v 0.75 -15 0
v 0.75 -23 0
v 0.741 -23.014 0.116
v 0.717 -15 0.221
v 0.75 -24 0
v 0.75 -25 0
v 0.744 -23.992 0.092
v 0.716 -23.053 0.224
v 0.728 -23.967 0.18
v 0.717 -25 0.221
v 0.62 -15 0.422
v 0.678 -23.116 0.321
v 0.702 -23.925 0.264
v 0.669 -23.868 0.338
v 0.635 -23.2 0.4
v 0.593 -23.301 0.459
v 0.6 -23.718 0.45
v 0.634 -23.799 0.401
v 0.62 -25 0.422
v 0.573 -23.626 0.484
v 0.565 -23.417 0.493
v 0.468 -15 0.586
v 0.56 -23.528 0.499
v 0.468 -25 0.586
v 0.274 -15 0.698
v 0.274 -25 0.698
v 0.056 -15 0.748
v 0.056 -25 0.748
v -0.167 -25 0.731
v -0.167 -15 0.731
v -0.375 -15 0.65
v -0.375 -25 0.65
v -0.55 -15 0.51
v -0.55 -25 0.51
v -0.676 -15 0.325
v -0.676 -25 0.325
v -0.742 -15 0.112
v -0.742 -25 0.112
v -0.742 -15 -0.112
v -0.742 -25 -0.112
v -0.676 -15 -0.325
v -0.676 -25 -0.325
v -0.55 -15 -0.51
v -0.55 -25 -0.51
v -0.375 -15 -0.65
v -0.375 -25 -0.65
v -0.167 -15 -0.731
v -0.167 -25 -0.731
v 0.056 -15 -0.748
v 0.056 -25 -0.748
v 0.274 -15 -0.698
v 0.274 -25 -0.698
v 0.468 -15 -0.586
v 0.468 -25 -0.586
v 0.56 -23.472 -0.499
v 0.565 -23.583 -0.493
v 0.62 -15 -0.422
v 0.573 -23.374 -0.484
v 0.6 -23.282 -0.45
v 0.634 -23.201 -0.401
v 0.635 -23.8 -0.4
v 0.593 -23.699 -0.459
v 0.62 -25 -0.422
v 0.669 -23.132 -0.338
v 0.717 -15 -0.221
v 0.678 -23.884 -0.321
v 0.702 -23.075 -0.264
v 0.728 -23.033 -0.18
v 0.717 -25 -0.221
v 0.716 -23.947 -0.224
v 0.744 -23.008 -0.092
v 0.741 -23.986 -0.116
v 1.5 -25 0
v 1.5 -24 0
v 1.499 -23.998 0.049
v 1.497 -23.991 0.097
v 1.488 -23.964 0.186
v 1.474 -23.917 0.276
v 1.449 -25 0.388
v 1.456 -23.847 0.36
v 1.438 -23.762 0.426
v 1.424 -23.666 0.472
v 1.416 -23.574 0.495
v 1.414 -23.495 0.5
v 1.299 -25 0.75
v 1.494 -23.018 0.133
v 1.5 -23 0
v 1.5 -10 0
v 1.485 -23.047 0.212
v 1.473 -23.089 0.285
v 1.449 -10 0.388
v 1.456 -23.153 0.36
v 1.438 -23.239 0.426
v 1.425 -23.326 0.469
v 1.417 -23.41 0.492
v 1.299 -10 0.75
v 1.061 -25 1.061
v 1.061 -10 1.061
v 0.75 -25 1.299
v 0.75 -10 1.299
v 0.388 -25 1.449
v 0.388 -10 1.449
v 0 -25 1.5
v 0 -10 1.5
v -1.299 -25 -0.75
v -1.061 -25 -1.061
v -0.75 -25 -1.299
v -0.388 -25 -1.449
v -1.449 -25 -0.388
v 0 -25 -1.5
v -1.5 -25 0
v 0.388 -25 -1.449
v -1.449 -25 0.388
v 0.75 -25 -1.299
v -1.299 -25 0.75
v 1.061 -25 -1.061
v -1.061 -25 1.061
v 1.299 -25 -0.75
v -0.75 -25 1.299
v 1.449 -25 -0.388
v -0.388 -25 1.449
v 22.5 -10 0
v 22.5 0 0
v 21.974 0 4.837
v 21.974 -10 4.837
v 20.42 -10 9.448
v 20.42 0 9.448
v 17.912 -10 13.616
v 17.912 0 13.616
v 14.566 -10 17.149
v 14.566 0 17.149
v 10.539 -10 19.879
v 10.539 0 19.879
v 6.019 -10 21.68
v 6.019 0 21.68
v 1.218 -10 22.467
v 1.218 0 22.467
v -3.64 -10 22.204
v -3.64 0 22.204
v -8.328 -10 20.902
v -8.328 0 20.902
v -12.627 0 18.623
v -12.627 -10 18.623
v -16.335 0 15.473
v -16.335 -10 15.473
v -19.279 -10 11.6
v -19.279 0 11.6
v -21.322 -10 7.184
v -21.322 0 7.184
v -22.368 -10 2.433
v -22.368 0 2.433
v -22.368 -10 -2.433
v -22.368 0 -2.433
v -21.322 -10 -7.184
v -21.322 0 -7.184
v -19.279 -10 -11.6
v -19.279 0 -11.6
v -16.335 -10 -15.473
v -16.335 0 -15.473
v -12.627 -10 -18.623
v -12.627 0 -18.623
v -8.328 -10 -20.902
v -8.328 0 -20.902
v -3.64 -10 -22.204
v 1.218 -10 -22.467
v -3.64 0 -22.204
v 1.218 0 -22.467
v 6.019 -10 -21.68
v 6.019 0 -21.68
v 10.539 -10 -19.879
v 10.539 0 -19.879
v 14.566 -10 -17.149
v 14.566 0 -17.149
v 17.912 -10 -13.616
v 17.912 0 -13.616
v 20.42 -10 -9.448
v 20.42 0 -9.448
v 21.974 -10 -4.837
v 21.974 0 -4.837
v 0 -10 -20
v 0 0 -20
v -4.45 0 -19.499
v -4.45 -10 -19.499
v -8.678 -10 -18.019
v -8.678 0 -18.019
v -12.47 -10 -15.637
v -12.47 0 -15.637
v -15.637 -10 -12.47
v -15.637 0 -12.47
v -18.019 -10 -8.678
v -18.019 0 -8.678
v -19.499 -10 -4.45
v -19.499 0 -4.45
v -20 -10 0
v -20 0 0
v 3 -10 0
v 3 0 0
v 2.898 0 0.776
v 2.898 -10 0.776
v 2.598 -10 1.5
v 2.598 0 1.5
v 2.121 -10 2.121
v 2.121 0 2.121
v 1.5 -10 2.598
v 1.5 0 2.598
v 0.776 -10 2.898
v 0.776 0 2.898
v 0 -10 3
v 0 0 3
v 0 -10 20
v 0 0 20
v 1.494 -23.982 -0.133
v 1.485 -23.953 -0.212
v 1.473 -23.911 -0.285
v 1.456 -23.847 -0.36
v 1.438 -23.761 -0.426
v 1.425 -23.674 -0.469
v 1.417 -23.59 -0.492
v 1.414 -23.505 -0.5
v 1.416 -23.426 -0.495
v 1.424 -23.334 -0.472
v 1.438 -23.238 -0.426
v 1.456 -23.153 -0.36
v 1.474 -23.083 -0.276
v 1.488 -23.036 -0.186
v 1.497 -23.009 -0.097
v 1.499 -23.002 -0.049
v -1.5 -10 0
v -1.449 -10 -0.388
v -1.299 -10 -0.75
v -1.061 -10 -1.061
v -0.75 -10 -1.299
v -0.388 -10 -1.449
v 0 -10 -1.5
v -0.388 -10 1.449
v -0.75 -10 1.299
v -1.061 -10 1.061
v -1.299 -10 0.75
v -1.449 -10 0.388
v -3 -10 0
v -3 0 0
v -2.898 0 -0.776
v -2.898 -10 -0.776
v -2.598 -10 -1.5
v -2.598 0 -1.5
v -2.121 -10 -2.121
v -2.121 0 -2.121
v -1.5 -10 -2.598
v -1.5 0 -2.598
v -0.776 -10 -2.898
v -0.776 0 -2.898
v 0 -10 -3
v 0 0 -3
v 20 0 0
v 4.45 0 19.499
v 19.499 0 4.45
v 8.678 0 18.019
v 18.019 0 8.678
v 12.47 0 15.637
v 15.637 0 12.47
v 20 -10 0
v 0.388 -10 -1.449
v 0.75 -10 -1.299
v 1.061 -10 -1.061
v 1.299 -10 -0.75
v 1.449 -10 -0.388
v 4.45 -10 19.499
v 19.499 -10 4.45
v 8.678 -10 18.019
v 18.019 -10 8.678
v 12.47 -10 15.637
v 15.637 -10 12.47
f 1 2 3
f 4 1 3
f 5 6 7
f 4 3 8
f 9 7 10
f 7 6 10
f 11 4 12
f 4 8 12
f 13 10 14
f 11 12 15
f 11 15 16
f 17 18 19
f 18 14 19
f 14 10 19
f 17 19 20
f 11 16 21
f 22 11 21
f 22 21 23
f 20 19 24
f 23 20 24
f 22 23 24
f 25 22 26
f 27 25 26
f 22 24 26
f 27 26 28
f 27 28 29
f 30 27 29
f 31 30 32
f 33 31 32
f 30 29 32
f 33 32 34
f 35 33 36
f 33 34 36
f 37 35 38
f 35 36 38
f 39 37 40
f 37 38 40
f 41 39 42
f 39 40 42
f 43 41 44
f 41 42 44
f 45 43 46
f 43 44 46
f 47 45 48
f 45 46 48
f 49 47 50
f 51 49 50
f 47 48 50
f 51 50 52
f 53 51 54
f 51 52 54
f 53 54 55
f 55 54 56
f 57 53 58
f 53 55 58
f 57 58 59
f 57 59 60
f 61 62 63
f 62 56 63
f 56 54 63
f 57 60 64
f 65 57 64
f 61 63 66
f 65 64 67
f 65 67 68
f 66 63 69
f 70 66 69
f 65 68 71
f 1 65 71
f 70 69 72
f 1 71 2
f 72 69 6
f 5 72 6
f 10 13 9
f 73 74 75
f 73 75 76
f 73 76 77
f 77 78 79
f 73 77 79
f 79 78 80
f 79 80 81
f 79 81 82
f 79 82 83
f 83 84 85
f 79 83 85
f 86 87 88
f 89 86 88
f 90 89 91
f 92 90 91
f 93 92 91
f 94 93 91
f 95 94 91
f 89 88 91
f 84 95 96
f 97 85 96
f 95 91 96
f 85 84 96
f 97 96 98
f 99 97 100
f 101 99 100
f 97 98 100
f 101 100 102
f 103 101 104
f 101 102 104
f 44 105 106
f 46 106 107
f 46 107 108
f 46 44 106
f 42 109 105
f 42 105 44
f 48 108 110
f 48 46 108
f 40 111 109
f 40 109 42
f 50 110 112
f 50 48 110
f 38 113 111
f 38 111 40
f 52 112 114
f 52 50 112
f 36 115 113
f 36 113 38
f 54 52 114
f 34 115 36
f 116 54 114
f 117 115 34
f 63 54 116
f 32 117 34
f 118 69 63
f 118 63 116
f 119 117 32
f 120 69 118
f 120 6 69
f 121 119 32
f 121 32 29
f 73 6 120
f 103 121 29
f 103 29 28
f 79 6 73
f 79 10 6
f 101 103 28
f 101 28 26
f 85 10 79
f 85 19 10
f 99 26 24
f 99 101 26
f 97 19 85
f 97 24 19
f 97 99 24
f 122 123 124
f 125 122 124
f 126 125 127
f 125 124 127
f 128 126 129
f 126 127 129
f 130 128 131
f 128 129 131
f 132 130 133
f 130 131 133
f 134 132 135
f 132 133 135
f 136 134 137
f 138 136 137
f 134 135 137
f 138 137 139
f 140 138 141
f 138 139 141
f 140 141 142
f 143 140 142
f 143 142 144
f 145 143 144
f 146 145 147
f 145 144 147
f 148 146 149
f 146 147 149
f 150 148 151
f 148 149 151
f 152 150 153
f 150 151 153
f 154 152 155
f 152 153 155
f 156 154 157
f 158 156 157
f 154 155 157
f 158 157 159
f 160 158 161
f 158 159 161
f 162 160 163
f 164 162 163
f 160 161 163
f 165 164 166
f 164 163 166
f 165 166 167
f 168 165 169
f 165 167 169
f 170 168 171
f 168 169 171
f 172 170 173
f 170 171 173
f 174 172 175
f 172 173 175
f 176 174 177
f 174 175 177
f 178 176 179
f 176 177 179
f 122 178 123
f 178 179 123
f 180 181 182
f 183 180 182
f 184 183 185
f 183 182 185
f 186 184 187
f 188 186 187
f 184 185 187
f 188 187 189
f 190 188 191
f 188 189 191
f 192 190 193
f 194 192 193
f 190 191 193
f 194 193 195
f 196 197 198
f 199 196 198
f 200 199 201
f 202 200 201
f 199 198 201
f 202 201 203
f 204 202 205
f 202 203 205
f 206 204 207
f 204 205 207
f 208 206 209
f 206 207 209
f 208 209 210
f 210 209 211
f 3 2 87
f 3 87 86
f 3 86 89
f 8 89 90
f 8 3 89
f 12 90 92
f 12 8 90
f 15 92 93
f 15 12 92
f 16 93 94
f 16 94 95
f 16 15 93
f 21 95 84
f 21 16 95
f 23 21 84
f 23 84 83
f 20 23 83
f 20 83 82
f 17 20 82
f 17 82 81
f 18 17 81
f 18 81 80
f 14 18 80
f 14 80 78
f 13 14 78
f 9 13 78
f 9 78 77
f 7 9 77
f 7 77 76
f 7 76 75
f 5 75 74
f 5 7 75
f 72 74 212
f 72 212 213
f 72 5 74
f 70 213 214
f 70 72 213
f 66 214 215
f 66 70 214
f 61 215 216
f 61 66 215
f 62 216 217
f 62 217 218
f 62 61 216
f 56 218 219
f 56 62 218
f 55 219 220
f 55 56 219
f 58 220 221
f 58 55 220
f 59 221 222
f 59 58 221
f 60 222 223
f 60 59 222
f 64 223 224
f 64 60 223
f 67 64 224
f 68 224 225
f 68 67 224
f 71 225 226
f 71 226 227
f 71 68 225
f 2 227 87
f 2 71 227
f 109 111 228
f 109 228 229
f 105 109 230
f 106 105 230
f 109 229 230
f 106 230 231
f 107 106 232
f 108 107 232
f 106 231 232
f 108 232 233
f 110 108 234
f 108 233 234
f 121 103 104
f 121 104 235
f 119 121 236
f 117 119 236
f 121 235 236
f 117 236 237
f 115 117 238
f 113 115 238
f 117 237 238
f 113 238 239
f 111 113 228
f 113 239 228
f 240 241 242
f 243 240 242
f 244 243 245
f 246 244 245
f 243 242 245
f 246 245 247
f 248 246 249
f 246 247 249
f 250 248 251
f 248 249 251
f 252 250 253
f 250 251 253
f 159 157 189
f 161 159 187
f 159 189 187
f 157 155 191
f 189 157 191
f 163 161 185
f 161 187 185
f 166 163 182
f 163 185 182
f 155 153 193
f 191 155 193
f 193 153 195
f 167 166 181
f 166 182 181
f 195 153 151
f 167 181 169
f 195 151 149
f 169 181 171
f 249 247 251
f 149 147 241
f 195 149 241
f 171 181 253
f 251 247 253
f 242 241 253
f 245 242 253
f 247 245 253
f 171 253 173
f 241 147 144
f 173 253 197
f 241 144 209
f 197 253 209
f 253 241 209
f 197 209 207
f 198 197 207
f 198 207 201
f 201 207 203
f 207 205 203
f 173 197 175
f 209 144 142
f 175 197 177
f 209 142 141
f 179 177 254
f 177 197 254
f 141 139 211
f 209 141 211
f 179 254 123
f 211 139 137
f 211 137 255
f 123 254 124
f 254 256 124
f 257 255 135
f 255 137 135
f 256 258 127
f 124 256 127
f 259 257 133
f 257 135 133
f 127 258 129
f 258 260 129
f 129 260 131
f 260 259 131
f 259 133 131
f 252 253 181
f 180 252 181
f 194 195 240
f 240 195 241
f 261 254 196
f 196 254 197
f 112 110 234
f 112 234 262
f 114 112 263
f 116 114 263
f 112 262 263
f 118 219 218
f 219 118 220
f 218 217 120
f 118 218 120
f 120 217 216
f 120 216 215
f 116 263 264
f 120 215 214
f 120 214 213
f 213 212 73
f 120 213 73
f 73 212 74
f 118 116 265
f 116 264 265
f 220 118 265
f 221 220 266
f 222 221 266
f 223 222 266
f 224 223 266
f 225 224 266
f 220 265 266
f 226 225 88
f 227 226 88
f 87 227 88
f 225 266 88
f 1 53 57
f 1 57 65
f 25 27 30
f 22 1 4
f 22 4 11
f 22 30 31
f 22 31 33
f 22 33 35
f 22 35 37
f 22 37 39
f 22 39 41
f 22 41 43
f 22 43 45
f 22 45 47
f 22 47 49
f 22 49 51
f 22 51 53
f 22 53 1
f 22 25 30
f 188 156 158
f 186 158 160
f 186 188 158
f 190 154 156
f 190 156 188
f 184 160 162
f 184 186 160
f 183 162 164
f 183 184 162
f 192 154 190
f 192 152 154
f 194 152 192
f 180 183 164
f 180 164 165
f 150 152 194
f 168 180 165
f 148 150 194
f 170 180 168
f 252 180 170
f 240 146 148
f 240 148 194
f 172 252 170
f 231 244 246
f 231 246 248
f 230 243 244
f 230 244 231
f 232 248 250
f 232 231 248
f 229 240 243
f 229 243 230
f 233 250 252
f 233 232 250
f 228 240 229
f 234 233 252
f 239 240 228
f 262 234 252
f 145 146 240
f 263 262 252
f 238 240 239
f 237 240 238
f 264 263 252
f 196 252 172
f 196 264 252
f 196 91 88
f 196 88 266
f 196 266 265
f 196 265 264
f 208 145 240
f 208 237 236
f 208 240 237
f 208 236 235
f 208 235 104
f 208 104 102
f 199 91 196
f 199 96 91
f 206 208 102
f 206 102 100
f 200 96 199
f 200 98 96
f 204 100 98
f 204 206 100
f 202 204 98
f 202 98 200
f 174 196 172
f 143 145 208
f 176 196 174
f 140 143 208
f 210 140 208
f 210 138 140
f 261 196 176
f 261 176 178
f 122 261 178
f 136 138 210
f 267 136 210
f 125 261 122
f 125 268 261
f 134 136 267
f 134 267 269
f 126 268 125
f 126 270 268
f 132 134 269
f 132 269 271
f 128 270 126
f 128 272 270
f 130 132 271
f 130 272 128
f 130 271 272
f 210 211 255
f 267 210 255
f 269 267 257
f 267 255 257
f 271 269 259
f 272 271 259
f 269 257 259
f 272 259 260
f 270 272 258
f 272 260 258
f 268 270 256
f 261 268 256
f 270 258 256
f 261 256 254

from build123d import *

# Parameters (mm, degrees)
F0_R     = 22.5
F1_DEPTH = 10
F2_DEPTH = 25
F4_R     = 0.5
F5_DEPTH = 2.5
F6_R     = 0.75
F7_DEPTH = 10


with BuildPart() as f1:
    # F0 (on Front) → F1 (new body)
    with BuildSketch(Plane.XZ):
        Circle(F0_R)
        with BuildLine():
            ThreePointArc((0, 20), (14.1421356237, 14.1421356237), (20, 0))
            ThreePointArc((20, 0), (14.1421356237, -14.1421356237), (0, -20))
            ThreePointArc((0, -20), (-14.1421356237, -14.1421356237), (-20, 0))
            ThreePointArc((-20, 0), (-14.1421356237, 14.1421356237), (0, 20))
        make_face(mode=Mode.SUBTRACT)
        with BuildLine():
            Line((0, 3), (0, 20))
            ThreePointArc((0, 20), (-14.1421356237, 14.1421356237), (-20, 0))
            Line((-20, 0), (-3, 0))
            ThreePointArc((-3, 0), (-2.1213203436, 2.1213203436), (0, 3))
        make_face()
        with BuildLine():
            Line((0, 1.5), (0, 3))
            ThreePointArc((0, 3), (-2.1213203436, 2.1213203436), (-3, 0))
            Line((-3, 0), (-1.5, 0))
            ThreePointArc((-1.5, 0), (-1.0606601718, 1.0606601718), (0, 1.5))
        make_face()
        with BuildLine():
            Line((1.5, 0), (3, 0))
            ThreePointArc((3, 0), (2.1213203436, 2.1213203436), (0, 3))
            Line((0, 3), (0, 1.5))
            ThreePointArc((0, 1.5), (1.0606601718, 1.0606601718), (1.5, 0))
        make_face()
        with BuildLine():
            ThreePointArc((-3, 0), (-2.1213203436, -2.1213203436), (0, -3))
            Line((0, -3), (0, -1.5))
            ThreePointArc((0, -1.5), (-1.0606601718, -1.0606601718), (-1.5, 0))
            Line((-1.5, 0), (-3, 0))
        make_face()
        with BuildLine():
            ThreePointArc((0, -3), (2.1213203436, -2.1213203436), (3, 0))
            Line((3, 0), (1.5, 0))
            ThreePointArc((1.5, 0), (1.0606601718, -1.0606601718), (0, -1.5))
            Line((0, -1.5), (0, -3))
        make_face()
        with BuildLine():
            ThreePointArc((0, -20), (14.1421356237, -14.1421356237), (20, 0))
            Line((20, 0), (3, 0))
            ThreePointArc((3, 0), (2.1213203436, -2.1213203436), (0, -3))
            Line((0, -3), (0, -20))
        make_face()
    extrude(amount=F1_DEPTH)

    # F0 (on Front) → F2 (join)
    with BuildSketch(Plane.XZ):
        with BuildLine():
            Line((0, 0), (0, 1.5))
            ThreePointArc((0, 1.5), (-1.0606601718, 1.0606601718), (-1.5, 0))
            Line((-1.5, 0), (0, 0))
        make_face()
        with BuildLine():
            ThreePointArc((-1.5, 0), (-1.0606601718, -1.0606601718), (0, -1.5))
            Line((0, -1.5), (0, 0))
            Line((0, 0), (-1.5, 0))
        make_face()
        with BuildLine():
            ThreePointArc((0, -1.5), (1.0606601718, -1.0606601718), (1.5, 0))
            Line((1.5, 0), (0, 0))
            Line((0, 0), (0, -1.5))
        make_face()
        with BuildLine():
            Line((0, 0), (1.5, 0))
            ThreePointArc((1.5, 0), (1.0606601718, 1.0606601718), (0, 1.5))
            Line((0, 1.5), (0, 0))
        make_face()
    extrude(amount=F2_DEPTH)

    # F4 (on face) → F5 (cut)
    with BuildSketch(Plane.YZ):
        with Locations((-23.5, 0)):
            Circle(F4_R)
    extrude(amount=F5_DEPTH, mode=Mode.SUBTRACT)

    # F6 (on face) → F7 (cut)
    with BuildSketch(Plane.XZ.offset(25)):
        Circle(F6_R)
    extrude(amount=-F7_DEPTH, mode=Mode.SUBTRACT)


solid = f1.part
